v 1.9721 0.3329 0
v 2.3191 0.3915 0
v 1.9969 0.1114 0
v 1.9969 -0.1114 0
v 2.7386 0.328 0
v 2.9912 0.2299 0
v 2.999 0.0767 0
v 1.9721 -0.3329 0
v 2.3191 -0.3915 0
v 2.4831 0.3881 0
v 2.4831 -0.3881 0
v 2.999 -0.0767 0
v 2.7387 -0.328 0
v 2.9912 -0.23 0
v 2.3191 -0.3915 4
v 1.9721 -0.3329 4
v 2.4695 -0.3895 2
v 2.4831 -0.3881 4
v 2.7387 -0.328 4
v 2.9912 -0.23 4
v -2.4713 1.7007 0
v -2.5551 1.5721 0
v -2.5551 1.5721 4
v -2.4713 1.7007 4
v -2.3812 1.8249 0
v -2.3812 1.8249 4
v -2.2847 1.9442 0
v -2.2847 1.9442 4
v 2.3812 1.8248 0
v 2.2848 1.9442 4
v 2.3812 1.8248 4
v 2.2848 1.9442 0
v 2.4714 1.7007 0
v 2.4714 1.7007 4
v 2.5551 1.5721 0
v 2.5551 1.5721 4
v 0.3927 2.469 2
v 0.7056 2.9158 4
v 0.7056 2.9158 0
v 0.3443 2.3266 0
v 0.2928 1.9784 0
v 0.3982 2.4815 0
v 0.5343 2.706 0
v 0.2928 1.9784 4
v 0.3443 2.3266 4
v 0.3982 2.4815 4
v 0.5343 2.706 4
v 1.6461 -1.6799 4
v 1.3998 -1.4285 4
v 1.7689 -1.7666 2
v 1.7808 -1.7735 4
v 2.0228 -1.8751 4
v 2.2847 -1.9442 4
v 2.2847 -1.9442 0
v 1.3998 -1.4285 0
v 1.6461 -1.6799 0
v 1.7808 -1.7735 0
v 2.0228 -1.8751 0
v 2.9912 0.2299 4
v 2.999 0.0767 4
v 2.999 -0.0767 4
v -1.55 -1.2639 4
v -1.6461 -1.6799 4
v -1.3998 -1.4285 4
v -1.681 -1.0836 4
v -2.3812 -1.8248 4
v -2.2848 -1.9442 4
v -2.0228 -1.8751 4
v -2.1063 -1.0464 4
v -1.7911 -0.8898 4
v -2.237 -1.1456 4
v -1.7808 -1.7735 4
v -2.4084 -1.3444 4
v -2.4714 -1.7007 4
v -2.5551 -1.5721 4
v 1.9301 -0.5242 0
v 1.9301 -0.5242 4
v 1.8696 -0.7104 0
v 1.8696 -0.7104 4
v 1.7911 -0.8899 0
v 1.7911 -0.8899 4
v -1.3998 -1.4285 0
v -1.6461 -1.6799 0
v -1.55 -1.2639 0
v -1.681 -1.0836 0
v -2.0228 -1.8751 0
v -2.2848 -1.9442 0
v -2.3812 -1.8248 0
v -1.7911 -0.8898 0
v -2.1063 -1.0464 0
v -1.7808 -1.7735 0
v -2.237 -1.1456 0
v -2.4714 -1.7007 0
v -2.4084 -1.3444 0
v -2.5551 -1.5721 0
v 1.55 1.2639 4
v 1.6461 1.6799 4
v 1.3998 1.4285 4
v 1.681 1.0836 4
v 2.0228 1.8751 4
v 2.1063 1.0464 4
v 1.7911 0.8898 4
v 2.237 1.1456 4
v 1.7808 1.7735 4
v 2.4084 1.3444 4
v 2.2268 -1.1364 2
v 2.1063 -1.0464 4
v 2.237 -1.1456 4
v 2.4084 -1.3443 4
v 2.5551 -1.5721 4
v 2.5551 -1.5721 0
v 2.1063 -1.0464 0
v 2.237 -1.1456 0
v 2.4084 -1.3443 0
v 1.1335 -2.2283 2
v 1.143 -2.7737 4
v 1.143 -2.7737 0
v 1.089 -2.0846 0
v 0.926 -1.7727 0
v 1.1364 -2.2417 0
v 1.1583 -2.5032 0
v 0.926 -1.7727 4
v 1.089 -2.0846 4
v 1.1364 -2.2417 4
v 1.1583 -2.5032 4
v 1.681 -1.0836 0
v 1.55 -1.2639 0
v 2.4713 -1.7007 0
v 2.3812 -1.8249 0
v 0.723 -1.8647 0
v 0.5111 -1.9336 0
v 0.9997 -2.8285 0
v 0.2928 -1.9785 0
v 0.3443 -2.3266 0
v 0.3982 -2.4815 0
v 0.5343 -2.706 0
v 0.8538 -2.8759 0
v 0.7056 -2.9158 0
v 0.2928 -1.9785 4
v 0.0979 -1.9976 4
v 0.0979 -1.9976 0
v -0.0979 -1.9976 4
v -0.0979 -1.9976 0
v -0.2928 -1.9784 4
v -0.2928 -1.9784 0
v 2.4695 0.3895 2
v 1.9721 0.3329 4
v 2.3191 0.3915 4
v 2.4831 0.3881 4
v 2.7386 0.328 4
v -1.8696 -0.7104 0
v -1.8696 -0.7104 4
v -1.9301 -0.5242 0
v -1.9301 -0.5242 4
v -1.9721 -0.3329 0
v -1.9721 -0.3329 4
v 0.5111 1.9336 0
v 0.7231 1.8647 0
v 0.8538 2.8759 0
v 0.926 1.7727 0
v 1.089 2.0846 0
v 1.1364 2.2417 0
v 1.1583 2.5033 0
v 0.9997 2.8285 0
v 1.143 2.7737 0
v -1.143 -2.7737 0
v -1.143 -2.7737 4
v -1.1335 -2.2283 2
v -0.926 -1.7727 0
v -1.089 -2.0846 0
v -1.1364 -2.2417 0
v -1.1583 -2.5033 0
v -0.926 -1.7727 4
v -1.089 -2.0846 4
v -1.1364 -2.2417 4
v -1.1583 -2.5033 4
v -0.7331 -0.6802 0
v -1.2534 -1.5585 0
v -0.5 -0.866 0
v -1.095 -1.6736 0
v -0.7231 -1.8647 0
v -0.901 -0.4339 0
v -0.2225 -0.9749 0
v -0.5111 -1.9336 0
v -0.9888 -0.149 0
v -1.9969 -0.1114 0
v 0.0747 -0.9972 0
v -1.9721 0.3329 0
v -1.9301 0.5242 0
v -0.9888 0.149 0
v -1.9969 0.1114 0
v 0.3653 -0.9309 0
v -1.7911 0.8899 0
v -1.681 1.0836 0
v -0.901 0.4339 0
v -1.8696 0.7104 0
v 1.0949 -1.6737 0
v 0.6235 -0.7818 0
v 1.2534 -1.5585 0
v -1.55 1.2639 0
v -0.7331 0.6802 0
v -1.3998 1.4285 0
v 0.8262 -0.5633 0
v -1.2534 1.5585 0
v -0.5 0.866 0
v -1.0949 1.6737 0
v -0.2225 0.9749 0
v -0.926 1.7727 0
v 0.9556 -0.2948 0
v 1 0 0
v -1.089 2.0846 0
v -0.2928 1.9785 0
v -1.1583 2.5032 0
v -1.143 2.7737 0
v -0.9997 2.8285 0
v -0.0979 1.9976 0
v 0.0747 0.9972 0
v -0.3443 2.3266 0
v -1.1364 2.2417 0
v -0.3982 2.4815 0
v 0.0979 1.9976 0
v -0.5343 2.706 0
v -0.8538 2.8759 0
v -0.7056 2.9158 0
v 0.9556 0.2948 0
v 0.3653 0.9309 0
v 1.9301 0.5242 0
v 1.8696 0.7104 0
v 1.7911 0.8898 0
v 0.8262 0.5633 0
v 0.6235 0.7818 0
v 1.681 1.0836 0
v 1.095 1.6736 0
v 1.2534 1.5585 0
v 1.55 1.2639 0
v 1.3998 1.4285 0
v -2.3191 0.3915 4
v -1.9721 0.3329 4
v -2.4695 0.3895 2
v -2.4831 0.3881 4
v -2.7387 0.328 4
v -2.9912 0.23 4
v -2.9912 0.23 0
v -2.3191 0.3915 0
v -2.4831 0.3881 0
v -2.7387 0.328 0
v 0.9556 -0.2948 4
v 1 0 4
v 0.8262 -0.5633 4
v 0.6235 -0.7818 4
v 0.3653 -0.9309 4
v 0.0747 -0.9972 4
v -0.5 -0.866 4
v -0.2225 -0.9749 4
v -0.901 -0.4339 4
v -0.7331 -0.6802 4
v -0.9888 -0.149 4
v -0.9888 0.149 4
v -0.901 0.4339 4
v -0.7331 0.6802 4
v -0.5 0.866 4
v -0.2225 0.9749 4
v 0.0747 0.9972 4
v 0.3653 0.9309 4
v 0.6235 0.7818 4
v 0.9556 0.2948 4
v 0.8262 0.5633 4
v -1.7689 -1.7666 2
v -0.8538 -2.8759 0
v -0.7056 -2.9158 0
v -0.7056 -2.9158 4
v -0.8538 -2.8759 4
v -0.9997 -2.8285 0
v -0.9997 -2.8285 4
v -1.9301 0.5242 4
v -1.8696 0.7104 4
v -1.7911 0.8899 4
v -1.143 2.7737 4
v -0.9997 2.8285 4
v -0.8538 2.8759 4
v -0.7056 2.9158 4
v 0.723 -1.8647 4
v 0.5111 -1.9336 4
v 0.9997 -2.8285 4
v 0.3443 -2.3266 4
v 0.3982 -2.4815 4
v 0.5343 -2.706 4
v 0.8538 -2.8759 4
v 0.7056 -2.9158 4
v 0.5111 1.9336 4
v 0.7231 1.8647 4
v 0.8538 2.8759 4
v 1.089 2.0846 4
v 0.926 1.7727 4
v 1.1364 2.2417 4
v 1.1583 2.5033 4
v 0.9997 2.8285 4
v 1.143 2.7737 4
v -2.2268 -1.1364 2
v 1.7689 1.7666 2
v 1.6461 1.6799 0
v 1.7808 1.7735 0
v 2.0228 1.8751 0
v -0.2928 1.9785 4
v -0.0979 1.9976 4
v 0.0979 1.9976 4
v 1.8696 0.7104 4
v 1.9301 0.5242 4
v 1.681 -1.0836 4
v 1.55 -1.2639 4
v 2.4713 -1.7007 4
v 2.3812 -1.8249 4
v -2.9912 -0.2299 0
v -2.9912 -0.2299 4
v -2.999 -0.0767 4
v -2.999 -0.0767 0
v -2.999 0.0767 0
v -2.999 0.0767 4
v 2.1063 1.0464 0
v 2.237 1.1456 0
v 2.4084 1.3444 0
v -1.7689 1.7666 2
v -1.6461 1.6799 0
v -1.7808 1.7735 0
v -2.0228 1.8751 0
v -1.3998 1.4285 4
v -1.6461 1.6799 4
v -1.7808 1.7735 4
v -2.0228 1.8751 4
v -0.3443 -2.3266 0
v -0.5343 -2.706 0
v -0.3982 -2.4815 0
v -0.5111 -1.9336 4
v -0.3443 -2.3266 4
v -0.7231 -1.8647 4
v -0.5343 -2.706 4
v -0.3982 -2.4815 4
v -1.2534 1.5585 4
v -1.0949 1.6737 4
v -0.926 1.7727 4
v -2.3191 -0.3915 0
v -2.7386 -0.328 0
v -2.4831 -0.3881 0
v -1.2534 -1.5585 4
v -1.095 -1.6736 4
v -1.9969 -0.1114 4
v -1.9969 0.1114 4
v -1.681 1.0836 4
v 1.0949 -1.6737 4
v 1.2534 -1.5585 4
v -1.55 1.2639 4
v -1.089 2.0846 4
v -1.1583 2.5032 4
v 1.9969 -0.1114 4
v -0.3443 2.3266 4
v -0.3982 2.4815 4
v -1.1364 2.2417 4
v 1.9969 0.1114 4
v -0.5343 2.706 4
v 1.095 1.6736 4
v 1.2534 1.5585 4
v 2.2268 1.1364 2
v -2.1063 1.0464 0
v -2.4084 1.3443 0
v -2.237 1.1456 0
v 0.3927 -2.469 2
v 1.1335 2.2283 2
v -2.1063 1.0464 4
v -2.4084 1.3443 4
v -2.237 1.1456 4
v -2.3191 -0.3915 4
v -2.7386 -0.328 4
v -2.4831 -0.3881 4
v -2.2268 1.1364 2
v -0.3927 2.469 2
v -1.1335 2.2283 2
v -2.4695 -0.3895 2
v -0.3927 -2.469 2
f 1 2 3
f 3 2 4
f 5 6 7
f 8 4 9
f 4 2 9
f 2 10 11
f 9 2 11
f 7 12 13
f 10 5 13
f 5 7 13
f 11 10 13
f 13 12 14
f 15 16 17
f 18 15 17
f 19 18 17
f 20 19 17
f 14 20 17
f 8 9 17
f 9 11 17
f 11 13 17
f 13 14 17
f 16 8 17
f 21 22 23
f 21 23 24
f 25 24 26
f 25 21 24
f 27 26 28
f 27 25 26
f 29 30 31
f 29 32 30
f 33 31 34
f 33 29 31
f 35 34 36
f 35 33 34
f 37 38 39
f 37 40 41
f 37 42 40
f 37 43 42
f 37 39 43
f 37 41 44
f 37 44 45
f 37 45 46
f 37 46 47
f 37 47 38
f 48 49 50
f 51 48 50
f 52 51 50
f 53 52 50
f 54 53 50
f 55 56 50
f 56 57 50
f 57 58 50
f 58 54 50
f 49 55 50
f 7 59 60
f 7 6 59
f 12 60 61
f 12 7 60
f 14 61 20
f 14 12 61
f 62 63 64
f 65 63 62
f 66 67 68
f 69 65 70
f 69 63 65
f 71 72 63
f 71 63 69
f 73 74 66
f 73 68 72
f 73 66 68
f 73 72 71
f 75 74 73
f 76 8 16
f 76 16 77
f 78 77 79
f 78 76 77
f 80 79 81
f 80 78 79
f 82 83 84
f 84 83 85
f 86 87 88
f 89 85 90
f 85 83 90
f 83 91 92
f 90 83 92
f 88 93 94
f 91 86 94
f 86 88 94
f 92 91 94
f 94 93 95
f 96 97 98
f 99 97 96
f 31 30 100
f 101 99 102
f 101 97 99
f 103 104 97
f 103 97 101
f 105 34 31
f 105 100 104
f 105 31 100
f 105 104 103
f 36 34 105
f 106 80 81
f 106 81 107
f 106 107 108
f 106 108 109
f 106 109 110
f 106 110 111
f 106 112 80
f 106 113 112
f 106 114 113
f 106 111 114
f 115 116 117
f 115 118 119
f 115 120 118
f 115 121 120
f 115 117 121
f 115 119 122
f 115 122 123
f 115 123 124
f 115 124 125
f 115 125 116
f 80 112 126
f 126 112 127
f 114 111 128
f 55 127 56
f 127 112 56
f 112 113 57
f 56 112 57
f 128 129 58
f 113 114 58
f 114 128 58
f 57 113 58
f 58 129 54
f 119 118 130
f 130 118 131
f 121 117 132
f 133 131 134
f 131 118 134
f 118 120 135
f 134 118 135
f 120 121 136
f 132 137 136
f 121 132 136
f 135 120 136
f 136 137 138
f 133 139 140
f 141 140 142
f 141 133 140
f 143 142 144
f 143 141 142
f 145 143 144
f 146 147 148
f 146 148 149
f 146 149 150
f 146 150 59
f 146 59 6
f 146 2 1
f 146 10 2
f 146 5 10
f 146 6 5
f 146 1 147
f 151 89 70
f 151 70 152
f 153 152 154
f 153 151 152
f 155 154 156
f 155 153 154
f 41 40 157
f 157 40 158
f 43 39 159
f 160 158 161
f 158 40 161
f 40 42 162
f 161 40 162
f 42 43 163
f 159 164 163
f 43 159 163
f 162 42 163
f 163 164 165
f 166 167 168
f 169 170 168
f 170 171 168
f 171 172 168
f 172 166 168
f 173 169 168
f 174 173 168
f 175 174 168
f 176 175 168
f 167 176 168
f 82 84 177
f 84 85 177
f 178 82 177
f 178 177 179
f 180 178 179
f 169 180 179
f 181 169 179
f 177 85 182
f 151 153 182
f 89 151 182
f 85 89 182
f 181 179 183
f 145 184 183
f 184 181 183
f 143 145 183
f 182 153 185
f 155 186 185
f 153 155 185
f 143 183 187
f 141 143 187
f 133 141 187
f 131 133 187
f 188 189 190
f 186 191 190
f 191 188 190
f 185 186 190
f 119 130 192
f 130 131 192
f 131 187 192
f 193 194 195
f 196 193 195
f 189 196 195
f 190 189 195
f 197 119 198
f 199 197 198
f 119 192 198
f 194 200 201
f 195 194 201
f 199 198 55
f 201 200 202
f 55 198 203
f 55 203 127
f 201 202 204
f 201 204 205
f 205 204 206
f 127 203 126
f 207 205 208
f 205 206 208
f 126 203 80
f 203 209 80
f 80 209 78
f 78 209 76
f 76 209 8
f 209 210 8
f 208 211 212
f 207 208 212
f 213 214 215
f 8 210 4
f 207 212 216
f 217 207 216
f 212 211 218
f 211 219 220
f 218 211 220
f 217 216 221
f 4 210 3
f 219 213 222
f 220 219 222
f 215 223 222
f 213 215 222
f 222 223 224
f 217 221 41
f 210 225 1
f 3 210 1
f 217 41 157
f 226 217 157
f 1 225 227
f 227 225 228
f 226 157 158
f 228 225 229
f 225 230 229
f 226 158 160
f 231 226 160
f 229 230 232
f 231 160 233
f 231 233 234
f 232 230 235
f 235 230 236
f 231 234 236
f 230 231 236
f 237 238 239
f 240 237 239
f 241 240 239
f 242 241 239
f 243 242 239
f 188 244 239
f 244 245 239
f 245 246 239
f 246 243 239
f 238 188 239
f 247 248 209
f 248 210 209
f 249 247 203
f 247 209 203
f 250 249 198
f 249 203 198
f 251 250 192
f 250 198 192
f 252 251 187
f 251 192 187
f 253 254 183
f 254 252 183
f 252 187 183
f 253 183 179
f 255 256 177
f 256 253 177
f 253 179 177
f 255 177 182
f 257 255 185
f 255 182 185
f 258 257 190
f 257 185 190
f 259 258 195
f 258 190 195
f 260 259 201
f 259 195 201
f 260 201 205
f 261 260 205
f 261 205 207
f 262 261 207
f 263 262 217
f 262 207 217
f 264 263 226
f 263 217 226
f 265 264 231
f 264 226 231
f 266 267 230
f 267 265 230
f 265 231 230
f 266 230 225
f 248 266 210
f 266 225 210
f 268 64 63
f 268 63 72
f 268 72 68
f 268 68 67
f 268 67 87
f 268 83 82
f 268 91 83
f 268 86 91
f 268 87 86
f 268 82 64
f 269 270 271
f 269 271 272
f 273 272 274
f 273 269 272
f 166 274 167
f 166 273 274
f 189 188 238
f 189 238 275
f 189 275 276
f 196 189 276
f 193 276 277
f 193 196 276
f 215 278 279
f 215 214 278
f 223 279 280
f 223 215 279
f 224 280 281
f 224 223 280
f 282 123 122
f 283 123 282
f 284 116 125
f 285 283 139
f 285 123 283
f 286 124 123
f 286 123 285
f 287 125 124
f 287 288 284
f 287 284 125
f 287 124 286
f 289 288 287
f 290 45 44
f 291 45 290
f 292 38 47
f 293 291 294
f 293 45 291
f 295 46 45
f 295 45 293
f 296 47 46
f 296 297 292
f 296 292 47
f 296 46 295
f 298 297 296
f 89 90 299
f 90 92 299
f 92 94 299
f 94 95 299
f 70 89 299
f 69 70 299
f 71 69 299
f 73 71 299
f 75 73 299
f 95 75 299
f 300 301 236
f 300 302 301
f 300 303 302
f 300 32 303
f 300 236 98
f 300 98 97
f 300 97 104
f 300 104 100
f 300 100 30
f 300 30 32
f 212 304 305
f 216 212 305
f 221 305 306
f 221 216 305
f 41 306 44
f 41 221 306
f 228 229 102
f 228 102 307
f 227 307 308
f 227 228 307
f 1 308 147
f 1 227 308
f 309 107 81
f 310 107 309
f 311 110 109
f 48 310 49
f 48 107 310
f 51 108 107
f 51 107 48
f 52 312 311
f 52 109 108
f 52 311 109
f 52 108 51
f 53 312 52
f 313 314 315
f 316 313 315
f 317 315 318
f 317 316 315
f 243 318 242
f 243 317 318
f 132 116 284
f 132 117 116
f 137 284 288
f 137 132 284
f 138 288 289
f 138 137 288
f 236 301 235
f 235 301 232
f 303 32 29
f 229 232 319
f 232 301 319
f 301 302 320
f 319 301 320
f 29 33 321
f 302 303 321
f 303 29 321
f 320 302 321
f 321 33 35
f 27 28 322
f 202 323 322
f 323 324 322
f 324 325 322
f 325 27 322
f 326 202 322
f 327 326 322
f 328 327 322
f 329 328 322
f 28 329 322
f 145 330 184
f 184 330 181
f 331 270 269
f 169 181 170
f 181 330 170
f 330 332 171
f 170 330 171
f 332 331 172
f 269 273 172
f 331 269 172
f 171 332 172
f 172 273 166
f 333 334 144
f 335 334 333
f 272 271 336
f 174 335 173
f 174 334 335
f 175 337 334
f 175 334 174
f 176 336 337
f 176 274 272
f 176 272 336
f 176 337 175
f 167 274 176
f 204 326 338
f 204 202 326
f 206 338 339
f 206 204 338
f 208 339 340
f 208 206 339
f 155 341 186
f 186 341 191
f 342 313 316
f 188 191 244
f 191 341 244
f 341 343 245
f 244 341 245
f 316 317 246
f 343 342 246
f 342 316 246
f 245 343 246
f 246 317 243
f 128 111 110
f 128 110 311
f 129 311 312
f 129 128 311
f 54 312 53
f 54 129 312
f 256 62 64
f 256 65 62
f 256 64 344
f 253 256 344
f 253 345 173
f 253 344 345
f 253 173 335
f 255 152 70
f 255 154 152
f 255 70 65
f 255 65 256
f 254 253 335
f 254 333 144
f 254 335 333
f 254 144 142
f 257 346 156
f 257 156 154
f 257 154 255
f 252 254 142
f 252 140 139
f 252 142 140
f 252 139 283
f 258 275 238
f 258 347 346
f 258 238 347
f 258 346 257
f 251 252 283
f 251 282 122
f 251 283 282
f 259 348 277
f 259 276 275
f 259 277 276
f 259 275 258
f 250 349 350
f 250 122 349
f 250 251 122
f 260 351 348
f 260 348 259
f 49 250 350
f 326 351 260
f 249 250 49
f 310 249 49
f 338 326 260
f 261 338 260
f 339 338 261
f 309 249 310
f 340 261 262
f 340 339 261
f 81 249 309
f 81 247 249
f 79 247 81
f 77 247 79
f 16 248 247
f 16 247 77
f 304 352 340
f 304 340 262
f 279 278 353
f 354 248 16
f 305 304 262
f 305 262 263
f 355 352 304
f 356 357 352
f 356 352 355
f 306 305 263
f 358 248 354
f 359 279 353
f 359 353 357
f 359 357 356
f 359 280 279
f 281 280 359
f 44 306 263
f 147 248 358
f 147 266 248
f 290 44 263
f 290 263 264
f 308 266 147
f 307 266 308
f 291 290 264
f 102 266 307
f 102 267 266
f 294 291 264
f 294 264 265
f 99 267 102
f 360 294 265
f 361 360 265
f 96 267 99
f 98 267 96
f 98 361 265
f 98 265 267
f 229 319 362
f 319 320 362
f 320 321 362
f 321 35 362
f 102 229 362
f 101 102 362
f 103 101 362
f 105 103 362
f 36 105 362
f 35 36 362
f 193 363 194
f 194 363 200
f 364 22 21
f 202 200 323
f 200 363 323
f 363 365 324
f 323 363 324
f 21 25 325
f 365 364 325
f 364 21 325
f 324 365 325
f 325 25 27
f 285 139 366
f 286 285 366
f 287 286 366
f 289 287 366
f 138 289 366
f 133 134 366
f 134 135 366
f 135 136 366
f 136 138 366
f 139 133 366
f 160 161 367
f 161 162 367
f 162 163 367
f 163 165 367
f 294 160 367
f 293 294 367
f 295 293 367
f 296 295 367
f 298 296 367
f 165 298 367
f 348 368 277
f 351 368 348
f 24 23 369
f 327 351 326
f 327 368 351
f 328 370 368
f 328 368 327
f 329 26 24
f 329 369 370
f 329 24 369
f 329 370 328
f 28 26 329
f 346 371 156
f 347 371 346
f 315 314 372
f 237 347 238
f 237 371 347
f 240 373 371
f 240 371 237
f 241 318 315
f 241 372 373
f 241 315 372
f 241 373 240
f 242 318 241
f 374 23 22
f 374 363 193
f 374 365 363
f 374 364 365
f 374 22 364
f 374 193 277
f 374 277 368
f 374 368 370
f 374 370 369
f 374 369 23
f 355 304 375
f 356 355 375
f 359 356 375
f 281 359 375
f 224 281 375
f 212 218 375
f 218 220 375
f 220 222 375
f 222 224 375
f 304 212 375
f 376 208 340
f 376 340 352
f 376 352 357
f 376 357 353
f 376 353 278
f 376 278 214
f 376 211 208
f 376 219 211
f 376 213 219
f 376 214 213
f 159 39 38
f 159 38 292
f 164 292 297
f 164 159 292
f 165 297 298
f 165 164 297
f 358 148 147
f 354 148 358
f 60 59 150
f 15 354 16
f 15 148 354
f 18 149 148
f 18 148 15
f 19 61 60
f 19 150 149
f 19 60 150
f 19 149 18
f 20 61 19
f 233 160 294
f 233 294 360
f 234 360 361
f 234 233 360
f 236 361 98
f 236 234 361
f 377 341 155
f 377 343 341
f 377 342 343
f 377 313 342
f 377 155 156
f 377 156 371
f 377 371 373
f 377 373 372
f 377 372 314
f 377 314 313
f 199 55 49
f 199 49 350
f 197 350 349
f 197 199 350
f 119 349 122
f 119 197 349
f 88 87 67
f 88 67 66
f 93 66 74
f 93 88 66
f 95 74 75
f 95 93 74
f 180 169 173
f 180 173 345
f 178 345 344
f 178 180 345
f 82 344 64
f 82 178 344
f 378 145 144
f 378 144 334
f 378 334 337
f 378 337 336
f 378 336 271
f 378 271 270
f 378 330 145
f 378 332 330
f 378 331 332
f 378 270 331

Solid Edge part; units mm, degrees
sketch "Sketch1" plane through (0, 0, 0) normal (0, 0, 1) x (1, 0, 0)
  spline S0 degree 3 poles (-0.2928, 1.9785) (-0.306, 2.1503) (-0.3512, 2.501) (-0.5844, 2.7739) (-0.7056, 2.9158) knots 0 0 0 0 0.479886 1 1 1 1
  arc A0 (-0.7056, 2.9158) -> (-1.143, 2.7737) centre (0, 0) ccw
  spline S1 degree 3 poles (-0.926, 1.7727) (-1.0163, 1.9195) (-1.1859, 2.2298) (-1.1577, 2.5876) (-1.143, 2.7737) knots 0 0 0 0 0.479886 1 1 1 1
  arc A1 (-0.926, 1.7727) -> (-0.2928, 1.9785) centre (0, 0) cw
extrude "Protrusion1" add sketch "Sketch1" along normal blind 4
sketch "Sketch2" plane through (0, 0, 0) normal (0, 0, 1) x (1, 0, 0)
  circle A0 centre (0, 0) radius 1
  circle A1 centre (0, 0) radius 2
extrude "Rad" add sketch "Sketch2" along normal blind 4
pattern_circular "Pattern1" count 10 over 360 about axis through (0, 0, 0) along (0, 0, 1) of "Protrusion1"
